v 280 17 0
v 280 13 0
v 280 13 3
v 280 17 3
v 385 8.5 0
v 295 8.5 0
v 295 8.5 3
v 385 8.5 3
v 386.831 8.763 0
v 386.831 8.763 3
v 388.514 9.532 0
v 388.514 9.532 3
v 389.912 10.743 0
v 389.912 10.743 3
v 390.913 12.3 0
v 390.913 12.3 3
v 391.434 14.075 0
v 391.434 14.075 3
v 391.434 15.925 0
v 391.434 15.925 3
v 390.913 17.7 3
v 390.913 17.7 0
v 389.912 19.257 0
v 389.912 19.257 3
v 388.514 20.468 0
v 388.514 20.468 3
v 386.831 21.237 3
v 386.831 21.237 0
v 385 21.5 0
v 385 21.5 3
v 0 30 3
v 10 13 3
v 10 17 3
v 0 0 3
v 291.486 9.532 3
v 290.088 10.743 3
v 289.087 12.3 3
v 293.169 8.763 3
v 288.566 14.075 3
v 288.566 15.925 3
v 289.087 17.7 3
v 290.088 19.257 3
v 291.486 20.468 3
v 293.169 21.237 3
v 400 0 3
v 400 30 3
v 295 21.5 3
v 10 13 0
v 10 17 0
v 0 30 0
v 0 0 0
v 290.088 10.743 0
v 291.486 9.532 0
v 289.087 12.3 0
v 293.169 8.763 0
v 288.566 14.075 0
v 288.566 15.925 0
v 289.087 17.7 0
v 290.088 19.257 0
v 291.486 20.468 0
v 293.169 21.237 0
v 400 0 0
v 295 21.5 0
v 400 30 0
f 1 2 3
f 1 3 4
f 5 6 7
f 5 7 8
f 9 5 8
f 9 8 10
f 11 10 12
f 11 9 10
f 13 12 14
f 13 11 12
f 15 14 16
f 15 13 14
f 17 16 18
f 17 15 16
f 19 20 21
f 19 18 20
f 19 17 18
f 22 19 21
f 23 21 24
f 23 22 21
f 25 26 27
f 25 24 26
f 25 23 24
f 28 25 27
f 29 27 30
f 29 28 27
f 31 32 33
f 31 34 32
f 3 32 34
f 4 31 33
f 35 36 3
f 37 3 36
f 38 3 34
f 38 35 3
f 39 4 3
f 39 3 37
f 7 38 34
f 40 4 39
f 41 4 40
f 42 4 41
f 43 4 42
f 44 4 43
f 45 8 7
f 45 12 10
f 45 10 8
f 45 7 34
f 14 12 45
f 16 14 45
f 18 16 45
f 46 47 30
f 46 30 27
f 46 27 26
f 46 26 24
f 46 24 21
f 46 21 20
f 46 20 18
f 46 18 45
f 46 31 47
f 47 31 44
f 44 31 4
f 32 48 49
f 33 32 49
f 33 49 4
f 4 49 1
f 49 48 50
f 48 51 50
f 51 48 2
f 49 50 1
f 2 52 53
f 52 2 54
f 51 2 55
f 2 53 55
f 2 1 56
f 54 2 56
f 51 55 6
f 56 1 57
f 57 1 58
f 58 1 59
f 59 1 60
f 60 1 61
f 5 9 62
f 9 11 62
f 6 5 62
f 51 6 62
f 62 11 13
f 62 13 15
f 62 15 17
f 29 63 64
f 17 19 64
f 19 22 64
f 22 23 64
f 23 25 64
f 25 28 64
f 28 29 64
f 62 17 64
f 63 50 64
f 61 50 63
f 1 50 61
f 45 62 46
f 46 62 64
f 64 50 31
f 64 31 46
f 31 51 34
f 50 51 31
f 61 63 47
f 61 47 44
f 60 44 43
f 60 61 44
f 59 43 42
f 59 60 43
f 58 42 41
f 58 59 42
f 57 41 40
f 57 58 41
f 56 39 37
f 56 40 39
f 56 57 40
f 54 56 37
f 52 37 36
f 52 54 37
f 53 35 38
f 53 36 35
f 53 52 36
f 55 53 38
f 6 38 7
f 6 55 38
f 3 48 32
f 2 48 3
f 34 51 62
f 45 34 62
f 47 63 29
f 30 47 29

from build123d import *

# Parameters (mm, degrees)
SKETCH_W     = 400
SKETCH_H     = 30
PAD_DEPTH    = 3
SKETCH001_W  = 270
SKETCH001_H  = 4
POCKET_DEPTH = 3.001


with BuildPart() as part:
    # Sketch → Pad (new body)
    with BuildSketch(Plane.XY):
        with Locations((200, 15)):
            Rectangle(SKETCH_W, SKETCH_H)
    extrude(amount=PAD_DEPTH)

    # Sketch001 → Pocket (cut, through all)
    with BuildSketch(Plane.XY):
        with Locations((145, 15)):
            Rectangle(SKETCH001_W, SKETCH001_H)
        with BuildLine():
            ThreePointArc((295, 21.5), (288.5, 15), (295, 8.5))
            Line((295, 8.5), (385, 8.5))
            ThreePointArc((385, 8.5), (391.5, 15), (385, 21.5))
            Line((295, 21.5), (385, 21.5))
        make_face()
    extrude(amount=POCKET_DEPTH, mode=Mode.SUBTRACT)


solid = part.part
